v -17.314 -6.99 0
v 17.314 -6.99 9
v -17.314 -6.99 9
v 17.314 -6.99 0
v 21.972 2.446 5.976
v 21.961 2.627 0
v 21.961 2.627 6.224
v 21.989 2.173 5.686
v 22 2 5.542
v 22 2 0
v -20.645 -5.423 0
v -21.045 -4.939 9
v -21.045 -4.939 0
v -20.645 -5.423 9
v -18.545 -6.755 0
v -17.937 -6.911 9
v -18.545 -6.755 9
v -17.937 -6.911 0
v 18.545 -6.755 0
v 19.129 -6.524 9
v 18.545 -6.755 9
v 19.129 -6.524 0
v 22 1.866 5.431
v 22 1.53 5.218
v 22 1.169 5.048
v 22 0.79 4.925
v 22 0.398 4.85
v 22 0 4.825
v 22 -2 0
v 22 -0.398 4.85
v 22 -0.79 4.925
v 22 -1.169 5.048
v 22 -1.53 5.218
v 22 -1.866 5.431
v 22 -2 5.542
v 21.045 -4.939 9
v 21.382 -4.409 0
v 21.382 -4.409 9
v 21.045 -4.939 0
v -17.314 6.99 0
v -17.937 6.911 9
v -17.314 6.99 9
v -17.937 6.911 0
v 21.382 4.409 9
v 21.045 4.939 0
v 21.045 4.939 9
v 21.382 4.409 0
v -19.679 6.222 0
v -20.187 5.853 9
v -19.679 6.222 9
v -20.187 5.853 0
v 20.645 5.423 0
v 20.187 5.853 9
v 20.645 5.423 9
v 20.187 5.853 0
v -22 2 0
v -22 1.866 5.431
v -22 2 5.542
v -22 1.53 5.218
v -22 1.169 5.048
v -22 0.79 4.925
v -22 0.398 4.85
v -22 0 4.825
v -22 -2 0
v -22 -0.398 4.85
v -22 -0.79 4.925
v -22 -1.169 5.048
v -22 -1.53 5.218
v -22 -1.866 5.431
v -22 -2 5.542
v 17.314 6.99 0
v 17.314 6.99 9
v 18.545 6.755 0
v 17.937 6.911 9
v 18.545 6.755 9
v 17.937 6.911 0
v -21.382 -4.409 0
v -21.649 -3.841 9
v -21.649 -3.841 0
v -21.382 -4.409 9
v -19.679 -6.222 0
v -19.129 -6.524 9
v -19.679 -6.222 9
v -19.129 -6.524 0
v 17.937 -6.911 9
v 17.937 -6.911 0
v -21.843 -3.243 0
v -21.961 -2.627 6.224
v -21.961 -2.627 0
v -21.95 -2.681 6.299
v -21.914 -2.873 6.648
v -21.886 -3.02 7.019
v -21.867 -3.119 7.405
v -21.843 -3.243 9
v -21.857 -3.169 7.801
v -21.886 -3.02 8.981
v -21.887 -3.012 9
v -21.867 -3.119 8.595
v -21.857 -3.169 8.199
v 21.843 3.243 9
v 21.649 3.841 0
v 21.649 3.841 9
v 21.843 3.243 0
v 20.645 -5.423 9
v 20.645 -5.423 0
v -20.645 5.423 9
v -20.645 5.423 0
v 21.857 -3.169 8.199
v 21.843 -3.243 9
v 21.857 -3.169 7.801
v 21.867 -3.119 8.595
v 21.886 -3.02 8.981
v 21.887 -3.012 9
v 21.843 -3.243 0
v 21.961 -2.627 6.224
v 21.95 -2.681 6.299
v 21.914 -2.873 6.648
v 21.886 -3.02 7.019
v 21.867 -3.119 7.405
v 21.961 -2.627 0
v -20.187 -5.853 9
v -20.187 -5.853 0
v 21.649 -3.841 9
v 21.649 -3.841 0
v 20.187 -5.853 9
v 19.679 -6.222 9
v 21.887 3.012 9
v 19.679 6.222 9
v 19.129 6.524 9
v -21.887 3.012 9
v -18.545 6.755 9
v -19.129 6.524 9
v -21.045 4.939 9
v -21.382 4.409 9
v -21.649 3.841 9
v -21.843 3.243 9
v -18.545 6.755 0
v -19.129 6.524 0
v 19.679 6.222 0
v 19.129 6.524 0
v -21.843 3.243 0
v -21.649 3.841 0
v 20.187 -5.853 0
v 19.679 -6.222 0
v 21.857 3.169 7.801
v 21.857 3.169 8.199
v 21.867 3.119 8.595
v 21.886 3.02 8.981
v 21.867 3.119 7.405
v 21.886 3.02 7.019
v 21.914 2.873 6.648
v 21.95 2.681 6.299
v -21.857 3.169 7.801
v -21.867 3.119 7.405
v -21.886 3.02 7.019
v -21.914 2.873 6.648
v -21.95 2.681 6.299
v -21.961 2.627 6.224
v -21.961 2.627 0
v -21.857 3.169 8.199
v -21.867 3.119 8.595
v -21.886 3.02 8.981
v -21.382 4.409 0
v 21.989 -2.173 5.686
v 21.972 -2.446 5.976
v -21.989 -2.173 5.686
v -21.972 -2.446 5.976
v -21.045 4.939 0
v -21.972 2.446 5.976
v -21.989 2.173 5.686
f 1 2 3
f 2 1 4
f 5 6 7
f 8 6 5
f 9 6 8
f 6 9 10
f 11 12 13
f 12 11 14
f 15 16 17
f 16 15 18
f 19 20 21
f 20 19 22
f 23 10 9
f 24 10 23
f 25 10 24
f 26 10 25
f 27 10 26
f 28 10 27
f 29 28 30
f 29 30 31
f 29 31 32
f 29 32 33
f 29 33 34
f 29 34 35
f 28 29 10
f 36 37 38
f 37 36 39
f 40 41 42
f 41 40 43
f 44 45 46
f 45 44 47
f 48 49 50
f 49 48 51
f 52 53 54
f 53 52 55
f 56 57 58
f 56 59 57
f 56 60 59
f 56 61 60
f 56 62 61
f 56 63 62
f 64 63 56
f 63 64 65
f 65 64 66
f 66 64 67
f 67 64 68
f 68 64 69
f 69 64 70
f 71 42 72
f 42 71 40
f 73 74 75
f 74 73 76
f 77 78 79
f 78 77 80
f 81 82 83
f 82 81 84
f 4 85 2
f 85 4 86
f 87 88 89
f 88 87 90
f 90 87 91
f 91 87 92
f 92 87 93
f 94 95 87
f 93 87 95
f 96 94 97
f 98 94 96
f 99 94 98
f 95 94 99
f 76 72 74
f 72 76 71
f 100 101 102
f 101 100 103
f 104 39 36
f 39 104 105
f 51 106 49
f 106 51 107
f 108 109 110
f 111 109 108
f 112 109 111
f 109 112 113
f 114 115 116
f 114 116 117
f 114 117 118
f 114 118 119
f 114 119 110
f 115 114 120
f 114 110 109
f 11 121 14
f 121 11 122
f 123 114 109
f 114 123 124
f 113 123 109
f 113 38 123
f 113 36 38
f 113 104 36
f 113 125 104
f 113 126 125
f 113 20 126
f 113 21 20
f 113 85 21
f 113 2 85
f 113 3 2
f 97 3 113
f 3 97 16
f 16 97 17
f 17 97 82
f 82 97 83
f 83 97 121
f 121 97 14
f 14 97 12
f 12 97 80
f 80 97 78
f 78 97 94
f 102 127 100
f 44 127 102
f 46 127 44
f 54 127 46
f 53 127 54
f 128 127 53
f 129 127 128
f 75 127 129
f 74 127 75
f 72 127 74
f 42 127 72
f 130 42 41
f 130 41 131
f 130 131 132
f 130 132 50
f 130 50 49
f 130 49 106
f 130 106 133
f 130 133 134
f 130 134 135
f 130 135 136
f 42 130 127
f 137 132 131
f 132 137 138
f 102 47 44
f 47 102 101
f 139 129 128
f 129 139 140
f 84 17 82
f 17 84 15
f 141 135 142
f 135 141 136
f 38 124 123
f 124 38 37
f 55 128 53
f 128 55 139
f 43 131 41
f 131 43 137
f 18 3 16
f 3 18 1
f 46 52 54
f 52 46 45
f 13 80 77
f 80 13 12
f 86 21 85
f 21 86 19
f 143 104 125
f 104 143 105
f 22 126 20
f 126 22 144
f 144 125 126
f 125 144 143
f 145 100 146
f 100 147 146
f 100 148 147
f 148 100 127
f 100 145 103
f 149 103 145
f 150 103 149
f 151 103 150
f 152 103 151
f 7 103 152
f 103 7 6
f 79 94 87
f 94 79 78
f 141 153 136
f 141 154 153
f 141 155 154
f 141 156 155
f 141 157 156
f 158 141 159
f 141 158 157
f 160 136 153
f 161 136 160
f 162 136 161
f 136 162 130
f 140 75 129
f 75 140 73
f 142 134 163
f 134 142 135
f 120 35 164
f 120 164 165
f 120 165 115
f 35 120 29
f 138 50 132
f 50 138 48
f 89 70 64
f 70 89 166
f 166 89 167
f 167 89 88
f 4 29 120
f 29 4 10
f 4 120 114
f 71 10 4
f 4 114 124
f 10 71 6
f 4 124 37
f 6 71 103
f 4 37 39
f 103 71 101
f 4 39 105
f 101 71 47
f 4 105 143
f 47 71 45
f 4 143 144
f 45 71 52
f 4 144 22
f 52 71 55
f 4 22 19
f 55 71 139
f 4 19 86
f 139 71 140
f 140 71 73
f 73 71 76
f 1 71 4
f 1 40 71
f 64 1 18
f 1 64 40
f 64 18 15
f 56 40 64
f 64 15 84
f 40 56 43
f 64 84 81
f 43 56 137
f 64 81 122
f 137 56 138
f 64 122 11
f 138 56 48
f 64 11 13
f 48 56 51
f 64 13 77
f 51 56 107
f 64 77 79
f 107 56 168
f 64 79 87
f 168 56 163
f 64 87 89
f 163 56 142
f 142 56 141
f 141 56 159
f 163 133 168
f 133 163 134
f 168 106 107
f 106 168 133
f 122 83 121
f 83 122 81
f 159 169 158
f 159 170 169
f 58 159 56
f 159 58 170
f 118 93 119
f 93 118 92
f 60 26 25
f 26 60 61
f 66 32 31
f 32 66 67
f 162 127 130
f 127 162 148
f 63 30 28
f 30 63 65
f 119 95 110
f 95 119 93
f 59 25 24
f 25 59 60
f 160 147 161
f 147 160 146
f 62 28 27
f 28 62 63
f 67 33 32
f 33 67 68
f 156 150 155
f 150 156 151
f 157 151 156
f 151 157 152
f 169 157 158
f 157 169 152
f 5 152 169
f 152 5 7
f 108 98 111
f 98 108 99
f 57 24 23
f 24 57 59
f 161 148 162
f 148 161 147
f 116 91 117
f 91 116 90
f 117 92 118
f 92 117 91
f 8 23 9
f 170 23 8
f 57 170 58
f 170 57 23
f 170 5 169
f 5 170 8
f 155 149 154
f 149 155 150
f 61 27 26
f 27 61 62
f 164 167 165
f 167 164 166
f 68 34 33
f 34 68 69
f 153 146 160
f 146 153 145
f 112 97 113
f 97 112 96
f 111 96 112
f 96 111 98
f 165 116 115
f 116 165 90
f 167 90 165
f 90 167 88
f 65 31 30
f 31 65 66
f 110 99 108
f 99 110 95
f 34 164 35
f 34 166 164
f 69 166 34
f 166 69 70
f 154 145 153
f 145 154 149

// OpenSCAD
$fn = 50;


difference() {
	union() {
		hull() {
			translate(v = [-17.0000000000, 2.0000000000, 0]) {
				cylinder(h = 9, r = 5);
			}
			translate(v = [17.0000000000, 2.0000000000, 0]) {
				cylinder(h = 9, r = 5);
			}
			translate(v = [-17.0000000000, -2.0000000000, 0]) {
				cylinder(h = 9, r = 5);
			}
			translate(v = [17.0000000000, -2.0000000000, 0]) {
				cylinder(h = 9, r = 5);
			}
		}
	}
	union() {
		#translate(v = [-22.5000000000, 0, 8.0000000000]) {
			rotate(a = [0, 90, 0]) {
				cylinder(h = 45, r = 3.1750000000);
			}
		}
	}
}
